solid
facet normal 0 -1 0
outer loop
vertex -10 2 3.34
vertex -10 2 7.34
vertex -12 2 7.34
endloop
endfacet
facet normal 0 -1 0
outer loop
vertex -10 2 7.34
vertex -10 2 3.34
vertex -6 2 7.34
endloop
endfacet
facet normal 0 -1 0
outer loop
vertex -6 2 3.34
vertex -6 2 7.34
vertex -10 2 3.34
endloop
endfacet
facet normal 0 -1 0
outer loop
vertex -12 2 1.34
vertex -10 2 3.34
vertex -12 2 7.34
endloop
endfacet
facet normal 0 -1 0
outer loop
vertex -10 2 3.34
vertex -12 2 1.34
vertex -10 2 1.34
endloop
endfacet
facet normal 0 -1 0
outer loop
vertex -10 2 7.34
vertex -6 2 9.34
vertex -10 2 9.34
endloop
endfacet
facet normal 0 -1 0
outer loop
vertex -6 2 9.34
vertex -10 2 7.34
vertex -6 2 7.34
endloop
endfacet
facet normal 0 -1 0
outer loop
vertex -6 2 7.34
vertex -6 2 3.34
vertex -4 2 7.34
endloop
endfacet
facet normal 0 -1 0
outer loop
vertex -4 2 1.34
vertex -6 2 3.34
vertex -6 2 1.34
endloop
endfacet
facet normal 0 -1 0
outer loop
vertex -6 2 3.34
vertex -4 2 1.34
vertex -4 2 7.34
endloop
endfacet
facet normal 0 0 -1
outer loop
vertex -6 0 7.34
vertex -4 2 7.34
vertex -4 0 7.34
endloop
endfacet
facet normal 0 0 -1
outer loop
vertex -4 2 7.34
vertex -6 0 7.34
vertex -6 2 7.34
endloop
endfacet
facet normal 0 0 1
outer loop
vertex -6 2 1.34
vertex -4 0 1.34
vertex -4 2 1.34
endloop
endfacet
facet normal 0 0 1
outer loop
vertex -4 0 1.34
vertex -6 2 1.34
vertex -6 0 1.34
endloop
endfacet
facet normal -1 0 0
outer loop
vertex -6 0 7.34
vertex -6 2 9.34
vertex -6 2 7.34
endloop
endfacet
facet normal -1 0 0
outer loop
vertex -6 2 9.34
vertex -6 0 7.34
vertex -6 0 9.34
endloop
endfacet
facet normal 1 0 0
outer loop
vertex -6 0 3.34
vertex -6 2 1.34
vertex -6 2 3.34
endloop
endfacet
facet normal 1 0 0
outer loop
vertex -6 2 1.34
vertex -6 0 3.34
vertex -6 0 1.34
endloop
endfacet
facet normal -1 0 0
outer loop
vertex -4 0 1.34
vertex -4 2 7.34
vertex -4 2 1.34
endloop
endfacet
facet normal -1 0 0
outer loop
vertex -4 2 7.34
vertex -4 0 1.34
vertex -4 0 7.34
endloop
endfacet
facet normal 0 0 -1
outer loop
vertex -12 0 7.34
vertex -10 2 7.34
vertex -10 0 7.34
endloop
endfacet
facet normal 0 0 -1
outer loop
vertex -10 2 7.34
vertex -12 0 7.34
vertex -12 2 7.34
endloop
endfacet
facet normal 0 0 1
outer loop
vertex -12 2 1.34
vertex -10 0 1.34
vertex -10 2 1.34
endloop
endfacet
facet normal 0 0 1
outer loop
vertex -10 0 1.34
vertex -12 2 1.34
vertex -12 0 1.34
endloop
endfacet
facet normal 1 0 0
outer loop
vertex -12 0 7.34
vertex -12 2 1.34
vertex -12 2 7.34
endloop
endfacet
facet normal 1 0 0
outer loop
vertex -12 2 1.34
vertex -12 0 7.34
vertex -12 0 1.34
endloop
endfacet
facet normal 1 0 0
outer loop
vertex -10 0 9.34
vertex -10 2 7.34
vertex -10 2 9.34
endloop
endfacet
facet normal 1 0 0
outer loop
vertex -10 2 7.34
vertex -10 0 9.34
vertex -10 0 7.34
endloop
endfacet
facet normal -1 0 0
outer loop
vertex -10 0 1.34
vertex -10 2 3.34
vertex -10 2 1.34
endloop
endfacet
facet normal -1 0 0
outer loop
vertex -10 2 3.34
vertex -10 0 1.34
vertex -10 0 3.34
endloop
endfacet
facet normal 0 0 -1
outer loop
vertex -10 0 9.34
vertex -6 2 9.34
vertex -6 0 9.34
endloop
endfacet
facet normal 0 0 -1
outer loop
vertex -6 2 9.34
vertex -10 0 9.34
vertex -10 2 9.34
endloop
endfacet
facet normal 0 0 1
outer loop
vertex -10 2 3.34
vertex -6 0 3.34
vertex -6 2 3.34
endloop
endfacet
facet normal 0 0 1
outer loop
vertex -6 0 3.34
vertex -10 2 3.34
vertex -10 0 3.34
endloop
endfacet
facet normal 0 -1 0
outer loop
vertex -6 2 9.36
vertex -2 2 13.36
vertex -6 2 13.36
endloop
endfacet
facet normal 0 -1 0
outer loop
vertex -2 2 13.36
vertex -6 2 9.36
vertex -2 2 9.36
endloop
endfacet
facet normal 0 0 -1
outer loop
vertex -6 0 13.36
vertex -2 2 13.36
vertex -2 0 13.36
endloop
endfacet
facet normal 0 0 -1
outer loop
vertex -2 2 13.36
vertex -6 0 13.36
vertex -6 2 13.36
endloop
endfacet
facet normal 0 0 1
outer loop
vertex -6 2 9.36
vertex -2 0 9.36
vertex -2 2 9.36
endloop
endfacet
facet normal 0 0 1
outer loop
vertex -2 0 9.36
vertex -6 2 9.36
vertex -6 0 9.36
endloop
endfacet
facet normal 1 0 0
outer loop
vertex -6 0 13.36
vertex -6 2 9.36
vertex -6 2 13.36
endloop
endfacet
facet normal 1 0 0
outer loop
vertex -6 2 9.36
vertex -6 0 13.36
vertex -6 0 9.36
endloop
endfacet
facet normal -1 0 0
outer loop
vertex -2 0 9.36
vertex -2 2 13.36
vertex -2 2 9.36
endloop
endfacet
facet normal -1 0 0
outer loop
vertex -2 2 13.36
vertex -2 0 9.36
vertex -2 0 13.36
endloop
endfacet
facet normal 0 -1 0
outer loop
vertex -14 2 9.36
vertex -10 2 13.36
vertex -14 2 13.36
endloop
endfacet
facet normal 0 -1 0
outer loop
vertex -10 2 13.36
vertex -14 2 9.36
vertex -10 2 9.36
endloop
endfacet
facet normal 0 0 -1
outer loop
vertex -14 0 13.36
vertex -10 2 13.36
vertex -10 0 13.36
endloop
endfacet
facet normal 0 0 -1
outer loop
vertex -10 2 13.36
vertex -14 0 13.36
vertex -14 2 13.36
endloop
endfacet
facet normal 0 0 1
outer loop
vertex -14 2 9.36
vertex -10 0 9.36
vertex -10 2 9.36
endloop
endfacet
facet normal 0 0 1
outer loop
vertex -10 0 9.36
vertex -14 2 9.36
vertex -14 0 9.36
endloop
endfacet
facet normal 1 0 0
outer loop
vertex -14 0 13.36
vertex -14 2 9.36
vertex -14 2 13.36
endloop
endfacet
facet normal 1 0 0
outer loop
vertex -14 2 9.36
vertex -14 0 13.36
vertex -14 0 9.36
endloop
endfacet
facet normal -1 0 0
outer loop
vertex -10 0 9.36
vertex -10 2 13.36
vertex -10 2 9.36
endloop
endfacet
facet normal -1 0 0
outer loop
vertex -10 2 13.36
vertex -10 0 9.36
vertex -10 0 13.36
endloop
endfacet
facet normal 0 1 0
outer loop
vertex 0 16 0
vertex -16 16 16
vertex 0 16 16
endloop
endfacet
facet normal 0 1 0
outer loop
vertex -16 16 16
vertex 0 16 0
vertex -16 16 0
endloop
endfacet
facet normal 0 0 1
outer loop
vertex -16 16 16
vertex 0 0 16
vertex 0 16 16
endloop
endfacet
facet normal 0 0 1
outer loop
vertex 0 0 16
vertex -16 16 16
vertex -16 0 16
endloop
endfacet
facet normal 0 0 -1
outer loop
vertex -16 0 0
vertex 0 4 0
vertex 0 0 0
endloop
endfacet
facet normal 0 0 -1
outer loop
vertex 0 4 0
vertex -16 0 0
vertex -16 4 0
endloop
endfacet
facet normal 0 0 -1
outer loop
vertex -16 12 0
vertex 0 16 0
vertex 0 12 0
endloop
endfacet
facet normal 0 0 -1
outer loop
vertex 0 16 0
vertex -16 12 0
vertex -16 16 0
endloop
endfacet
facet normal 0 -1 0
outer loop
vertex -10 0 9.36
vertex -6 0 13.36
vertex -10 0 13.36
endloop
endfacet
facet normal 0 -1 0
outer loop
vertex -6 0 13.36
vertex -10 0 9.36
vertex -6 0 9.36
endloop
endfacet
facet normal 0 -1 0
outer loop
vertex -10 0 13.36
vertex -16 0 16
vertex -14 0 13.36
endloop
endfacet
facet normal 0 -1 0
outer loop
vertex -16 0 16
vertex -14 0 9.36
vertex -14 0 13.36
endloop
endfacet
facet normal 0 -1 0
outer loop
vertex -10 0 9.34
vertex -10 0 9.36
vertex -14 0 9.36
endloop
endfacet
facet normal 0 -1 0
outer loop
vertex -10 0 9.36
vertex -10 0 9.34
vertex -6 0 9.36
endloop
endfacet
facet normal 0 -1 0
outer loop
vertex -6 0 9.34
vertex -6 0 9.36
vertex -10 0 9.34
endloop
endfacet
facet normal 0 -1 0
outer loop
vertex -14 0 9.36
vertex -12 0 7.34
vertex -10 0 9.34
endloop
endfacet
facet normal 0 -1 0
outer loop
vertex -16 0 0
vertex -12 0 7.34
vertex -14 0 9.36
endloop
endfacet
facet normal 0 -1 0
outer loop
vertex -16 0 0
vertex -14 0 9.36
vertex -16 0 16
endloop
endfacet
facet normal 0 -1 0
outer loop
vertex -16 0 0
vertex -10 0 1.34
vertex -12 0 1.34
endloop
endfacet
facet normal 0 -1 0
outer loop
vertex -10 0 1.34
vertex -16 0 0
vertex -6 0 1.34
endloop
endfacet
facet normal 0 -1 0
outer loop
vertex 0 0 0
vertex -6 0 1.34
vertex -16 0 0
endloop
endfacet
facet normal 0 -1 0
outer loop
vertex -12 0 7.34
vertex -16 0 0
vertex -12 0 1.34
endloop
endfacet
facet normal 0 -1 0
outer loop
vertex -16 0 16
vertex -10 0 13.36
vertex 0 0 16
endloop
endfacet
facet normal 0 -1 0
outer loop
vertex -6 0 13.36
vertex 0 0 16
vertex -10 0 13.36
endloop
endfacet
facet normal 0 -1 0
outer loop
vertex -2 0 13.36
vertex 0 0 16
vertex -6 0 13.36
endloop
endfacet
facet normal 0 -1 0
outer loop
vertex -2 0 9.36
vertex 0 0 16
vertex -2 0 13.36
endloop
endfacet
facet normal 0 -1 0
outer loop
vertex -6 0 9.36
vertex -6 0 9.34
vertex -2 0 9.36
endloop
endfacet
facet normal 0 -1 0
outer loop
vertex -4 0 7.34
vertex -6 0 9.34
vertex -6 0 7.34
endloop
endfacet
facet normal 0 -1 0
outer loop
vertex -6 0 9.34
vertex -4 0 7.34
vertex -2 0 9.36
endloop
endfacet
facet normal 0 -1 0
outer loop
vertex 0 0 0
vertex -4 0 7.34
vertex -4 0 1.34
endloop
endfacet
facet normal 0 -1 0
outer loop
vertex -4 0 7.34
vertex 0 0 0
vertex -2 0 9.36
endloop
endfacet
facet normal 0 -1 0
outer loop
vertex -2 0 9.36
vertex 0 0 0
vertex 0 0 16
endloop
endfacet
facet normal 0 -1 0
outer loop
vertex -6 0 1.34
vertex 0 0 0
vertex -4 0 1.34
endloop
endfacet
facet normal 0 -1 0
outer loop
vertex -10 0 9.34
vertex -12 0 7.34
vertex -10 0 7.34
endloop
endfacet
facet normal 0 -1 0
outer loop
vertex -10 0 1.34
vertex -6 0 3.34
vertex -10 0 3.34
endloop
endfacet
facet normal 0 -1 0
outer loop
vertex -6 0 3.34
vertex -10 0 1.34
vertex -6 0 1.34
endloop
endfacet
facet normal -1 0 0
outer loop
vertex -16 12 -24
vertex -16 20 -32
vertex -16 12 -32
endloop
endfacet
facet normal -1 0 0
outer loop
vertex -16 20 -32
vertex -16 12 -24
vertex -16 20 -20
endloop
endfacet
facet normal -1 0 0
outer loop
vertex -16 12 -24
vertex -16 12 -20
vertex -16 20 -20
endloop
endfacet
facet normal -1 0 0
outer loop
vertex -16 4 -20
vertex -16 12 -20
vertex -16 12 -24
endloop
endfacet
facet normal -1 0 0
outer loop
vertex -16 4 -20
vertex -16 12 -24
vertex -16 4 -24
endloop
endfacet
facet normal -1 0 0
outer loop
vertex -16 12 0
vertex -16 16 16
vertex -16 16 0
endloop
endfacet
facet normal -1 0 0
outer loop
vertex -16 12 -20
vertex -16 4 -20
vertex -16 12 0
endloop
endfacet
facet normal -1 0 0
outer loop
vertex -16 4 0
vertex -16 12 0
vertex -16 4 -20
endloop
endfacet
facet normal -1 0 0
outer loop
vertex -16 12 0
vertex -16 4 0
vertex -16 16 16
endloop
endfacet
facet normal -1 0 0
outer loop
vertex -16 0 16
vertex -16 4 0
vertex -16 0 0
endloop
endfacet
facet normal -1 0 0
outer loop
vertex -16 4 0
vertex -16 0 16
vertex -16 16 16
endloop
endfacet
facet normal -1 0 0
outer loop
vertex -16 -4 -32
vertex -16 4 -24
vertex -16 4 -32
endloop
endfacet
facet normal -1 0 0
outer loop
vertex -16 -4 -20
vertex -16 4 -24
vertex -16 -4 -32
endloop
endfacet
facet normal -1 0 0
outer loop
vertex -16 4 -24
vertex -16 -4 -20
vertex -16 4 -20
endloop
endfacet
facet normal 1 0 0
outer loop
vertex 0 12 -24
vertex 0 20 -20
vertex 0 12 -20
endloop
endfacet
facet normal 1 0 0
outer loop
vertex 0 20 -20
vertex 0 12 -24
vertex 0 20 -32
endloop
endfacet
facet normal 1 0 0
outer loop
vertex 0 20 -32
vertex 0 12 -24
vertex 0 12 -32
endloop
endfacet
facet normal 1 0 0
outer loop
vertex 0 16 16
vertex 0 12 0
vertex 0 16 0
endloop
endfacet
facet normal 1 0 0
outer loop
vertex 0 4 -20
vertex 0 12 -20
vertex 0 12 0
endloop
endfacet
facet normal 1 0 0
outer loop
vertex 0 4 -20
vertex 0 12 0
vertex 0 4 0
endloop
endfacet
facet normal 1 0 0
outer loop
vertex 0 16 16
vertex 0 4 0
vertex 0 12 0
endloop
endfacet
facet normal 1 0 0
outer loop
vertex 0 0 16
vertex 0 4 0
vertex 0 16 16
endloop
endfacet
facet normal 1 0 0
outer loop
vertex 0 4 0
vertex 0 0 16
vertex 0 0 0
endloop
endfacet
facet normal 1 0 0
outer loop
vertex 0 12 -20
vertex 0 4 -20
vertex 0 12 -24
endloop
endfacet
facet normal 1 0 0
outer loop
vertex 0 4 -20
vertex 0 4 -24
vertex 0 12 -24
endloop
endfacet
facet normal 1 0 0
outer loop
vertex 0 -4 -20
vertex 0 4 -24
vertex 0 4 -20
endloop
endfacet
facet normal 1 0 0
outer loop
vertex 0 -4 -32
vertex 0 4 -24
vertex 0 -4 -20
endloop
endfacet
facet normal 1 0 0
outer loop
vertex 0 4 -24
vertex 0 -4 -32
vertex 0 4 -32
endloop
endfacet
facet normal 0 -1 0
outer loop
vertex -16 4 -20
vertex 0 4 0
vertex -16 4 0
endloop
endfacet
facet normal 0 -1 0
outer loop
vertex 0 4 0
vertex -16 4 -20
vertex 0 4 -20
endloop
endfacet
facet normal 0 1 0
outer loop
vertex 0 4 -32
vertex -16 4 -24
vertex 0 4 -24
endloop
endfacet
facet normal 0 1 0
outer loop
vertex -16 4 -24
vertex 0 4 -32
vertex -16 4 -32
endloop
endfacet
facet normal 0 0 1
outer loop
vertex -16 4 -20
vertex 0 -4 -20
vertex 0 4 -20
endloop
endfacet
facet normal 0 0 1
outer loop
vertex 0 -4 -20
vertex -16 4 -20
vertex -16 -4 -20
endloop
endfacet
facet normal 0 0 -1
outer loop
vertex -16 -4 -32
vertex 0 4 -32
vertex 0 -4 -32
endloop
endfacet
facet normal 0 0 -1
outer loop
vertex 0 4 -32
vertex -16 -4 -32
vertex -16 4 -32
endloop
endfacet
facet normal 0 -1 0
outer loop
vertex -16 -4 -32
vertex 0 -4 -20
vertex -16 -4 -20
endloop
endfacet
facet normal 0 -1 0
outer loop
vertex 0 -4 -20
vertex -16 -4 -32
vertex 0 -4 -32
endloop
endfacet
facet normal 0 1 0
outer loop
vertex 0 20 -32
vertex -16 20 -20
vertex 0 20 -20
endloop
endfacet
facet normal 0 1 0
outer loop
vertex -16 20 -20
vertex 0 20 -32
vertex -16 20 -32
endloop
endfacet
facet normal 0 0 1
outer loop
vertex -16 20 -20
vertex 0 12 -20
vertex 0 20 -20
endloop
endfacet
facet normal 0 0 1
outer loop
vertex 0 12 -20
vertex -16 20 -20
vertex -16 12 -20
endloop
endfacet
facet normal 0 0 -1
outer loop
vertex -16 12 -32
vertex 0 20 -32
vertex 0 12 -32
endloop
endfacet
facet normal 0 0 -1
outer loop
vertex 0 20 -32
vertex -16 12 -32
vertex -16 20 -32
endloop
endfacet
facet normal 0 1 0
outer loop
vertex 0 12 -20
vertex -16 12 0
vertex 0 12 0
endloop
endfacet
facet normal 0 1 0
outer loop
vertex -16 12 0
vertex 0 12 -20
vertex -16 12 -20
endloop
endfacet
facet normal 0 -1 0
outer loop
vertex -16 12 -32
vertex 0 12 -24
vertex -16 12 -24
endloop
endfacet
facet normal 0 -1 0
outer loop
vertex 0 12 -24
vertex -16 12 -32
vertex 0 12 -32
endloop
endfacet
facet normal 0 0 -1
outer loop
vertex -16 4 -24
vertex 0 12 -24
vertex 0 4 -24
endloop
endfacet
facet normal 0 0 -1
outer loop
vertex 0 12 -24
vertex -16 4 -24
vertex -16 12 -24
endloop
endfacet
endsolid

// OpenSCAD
// Minecraft Creeper Keychain
// v2, now with facial features and a better keychain attachment
// Nudel 2011

//set to 0 for no facial expressions
face_depth = 1;//[0,1]

which_face="scary";//[happy,scary]

//radius of hole for keychain
hole_size = 0; // [0:2]  

creeper(which_face);
module creeper(f){

/*do_scary_face = 0;
do_happy_face = 1;*/

rotate([0,0,90]) //rotated to lay flat
scale(2) //1 pixel = 2mm

difference(){

union()
{

	//Head
	difference(){	
		cube([8,8,8 ]);

if(face_depth>0){
	
	if(f=="scary"){
	//Scary face O_O
	translate([0,0,-0.33])
	union(){
		for(i=[2,5]) {
			#translate([-face_depth,i,1]) cube([face_depth*2,1,3]);
		}
		for(i=[3,4]) {
			#translate([-face_depth,i,2]) cube([face_depth*2,1,3]);
		}
		for(i=[1,5]) {
			#translate([-face_depth,i,5+0.01]) cube([face_depth*2,2,2]);
		}
	}
	}else{
	//Happy face ^_^
	translate([8,0,-0.33])
	union(){
		for(i=[2,5]) {#translate([-face_depth,i,2]) cube([face_depth*2,1,2]);}
		for(i=[3,4]) {#translate([-face_depth,i,1]) cube([face_depth*2,1,2]);}
		for(i=[1,5]) {#translate([-face_depth,i,5]) cube([face_depth*2,2,2]);}
	}
	}
}

}

	//Body
	translate([2,0,-12]) cube([4,8,12]);

	//Legs
	translate([0,0,2]) //moved a bit up to attach to the body
	union()
	{
		translate([-2,0,-18]) cube([4,4,6]);
		translate([-2,4,-18]) cube([4,4,6]);
		translate([ 6,0,-18]) cube([4,4,6]);
		translate([ 6,4,-18]) cube([4,4,6]);
	}

/*
// Old v1 chain attachment
rotate([0,90,0]) 
translate([-8,4,5])
{

#rotate_extrude(convexity = 10,$fn=20)
translate([3, 0, 0])
circle(r = 1,$fn=20);

}
*/

}

if(hole_size>0){
	//Hole in head for piercing equipment.
	//You might have to experiment with this to make it fit your keychain.
	rotate([0,90,0])
	translate([-8,0,4])
	{
		rotate_extrude(convexity = 10,$fn=20)
		translate([3, 0, 0])
		circle(r = hole_size,$fn=20);
	}
}


}
}
